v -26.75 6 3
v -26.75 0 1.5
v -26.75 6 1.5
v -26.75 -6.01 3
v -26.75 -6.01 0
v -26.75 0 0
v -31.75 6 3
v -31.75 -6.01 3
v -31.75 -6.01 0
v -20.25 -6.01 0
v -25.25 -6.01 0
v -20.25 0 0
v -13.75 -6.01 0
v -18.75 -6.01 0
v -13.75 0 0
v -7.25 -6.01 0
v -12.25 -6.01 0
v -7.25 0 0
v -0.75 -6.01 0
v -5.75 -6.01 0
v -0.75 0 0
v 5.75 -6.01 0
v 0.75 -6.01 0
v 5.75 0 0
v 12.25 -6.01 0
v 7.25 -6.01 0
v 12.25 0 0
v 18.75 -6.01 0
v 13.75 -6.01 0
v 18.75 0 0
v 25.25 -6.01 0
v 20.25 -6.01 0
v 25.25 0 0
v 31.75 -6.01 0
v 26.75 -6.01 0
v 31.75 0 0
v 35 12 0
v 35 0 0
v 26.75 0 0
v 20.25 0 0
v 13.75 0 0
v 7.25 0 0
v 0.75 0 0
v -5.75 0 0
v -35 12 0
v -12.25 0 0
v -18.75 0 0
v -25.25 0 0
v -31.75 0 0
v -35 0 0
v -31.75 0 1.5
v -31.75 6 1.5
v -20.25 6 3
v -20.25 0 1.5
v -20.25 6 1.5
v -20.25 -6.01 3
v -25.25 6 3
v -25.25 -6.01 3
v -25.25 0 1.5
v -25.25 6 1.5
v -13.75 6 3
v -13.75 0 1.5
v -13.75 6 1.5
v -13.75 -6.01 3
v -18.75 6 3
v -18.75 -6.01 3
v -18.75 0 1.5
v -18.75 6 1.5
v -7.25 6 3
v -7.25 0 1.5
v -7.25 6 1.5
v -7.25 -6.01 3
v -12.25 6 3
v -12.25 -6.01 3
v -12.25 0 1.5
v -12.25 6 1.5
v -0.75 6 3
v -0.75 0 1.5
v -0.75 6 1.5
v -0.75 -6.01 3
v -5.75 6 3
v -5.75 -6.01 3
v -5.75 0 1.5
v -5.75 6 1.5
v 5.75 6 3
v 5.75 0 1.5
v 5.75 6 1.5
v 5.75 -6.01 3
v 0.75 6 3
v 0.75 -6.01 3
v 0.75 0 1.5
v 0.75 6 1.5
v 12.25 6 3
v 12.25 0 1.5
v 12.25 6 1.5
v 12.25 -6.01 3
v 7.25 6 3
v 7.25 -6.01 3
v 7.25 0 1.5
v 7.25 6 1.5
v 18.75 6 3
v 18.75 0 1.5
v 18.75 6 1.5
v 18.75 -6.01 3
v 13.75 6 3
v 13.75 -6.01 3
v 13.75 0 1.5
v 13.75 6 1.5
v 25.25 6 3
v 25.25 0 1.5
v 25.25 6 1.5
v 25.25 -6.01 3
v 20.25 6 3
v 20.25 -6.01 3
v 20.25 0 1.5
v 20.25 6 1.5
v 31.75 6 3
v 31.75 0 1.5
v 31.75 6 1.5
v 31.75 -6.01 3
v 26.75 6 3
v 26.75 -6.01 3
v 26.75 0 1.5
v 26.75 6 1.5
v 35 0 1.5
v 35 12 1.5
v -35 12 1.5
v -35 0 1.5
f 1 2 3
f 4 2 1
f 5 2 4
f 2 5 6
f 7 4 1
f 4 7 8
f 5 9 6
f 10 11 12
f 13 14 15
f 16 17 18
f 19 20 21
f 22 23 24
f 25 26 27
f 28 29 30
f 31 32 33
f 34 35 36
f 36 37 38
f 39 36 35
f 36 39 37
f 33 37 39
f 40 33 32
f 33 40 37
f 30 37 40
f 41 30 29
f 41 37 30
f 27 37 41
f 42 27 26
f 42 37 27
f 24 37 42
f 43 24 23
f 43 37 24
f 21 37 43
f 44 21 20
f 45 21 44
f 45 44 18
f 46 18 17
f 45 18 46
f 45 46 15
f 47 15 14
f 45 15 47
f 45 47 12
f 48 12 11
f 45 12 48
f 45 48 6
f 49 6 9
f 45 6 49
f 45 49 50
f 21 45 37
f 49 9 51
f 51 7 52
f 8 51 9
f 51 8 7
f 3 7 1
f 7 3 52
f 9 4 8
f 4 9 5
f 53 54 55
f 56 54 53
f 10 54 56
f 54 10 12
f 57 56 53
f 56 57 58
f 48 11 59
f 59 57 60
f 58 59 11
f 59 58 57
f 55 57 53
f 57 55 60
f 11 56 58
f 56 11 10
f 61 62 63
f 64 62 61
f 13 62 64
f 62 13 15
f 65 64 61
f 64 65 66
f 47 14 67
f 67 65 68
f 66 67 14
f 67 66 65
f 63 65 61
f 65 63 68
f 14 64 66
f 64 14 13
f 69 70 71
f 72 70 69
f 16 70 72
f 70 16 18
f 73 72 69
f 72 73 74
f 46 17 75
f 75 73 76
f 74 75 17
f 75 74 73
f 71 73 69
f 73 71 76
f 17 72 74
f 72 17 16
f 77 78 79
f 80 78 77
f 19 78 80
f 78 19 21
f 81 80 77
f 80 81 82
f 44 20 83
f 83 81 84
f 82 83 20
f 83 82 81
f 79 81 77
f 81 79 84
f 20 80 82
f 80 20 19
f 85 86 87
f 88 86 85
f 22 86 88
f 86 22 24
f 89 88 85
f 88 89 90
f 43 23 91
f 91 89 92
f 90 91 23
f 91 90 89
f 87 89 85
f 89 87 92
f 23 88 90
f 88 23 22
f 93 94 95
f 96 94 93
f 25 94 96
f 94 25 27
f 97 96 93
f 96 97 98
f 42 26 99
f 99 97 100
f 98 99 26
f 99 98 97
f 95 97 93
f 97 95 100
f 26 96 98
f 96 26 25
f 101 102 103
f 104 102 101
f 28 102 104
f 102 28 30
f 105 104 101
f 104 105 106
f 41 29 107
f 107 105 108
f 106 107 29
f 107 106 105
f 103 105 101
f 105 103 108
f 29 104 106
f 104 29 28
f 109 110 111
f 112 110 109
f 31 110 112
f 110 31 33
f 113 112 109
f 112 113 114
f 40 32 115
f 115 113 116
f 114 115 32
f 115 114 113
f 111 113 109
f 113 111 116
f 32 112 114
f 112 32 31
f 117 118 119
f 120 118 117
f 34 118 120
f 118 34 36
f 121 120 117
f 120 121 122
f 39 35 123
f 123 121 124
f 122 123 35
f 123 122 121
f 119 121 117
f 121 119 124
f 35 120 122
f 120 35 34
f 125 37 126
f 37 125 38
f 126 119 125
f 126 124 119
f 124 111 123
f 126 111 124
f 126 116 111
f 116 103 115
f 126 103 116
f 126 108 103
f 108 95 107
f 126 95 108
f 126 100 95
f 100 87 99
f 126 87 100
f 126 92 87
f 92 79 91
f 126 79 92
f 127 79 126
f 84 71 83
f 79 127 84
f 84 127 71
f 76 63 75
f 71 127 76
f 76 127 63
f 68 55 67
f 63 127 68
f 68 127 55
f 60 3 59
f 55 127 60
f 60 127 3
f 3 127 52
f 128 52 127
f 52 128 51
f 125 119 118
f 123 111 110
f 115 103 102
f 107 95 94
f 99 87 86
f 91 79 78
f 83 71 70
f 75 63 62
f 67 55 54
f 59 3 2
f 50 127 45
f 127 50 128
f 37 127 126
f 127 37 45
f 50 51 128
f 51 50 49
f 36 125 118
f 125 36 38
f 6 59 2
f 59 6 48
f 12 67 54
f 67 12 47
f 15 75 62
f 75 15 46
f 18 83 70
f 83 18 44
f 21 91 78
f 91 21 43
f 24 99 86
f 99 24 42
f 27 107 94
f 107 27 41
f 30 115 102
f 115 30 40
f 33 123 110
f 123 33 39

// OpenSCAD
// 10-well comb for casting agarose gels
// Print orientation: flat on bed, teeth pointing down (-Z)

// ---------- Parameters ----------
spine_len    = 70;    // spine length along X (mm)
spine_w      = 12;    // spine width along Y (mm)
plate_t      = 1.5;   // plate thickness along Z (mm)

tooth_count  = 10;    // number of teeth
tooth_w      = 5.0;   // tooth width along X (mm)
tooth_l      = 12;    // tooth length along Y (mm)

gap          = 1.5;   // gap between neighbouring teeth (mm)
overhang     = 1.5;   // tooth extension past the spine edge (mm)

eps          = 0.01;  // small overlap for clean union

$fn = 64;

// ---------- Derived ----------
pitch   = tooth_w + gap;              // centre-to-centre tooth spacing
x_start = -(tooth_count - 1) * pitch / 2;  // first tooth centre (row centred)

// ---------- Model ----------
union() {
    // Spine (back bar)
    translate([-spine_len / 2, 0, 0])
        cube([spine_len, spine_w, plate_t]);

    // Teeth hanging from the -Y edge
    for (i = [0 : tooth_count - 1])
        translate([x_start + i * pitch - tooth_w / 2,
                   -spine_w / 2 - eps,
                   0])
            cube([tooth_w, tooth_l + eps, plate_t + overhang]);
}
